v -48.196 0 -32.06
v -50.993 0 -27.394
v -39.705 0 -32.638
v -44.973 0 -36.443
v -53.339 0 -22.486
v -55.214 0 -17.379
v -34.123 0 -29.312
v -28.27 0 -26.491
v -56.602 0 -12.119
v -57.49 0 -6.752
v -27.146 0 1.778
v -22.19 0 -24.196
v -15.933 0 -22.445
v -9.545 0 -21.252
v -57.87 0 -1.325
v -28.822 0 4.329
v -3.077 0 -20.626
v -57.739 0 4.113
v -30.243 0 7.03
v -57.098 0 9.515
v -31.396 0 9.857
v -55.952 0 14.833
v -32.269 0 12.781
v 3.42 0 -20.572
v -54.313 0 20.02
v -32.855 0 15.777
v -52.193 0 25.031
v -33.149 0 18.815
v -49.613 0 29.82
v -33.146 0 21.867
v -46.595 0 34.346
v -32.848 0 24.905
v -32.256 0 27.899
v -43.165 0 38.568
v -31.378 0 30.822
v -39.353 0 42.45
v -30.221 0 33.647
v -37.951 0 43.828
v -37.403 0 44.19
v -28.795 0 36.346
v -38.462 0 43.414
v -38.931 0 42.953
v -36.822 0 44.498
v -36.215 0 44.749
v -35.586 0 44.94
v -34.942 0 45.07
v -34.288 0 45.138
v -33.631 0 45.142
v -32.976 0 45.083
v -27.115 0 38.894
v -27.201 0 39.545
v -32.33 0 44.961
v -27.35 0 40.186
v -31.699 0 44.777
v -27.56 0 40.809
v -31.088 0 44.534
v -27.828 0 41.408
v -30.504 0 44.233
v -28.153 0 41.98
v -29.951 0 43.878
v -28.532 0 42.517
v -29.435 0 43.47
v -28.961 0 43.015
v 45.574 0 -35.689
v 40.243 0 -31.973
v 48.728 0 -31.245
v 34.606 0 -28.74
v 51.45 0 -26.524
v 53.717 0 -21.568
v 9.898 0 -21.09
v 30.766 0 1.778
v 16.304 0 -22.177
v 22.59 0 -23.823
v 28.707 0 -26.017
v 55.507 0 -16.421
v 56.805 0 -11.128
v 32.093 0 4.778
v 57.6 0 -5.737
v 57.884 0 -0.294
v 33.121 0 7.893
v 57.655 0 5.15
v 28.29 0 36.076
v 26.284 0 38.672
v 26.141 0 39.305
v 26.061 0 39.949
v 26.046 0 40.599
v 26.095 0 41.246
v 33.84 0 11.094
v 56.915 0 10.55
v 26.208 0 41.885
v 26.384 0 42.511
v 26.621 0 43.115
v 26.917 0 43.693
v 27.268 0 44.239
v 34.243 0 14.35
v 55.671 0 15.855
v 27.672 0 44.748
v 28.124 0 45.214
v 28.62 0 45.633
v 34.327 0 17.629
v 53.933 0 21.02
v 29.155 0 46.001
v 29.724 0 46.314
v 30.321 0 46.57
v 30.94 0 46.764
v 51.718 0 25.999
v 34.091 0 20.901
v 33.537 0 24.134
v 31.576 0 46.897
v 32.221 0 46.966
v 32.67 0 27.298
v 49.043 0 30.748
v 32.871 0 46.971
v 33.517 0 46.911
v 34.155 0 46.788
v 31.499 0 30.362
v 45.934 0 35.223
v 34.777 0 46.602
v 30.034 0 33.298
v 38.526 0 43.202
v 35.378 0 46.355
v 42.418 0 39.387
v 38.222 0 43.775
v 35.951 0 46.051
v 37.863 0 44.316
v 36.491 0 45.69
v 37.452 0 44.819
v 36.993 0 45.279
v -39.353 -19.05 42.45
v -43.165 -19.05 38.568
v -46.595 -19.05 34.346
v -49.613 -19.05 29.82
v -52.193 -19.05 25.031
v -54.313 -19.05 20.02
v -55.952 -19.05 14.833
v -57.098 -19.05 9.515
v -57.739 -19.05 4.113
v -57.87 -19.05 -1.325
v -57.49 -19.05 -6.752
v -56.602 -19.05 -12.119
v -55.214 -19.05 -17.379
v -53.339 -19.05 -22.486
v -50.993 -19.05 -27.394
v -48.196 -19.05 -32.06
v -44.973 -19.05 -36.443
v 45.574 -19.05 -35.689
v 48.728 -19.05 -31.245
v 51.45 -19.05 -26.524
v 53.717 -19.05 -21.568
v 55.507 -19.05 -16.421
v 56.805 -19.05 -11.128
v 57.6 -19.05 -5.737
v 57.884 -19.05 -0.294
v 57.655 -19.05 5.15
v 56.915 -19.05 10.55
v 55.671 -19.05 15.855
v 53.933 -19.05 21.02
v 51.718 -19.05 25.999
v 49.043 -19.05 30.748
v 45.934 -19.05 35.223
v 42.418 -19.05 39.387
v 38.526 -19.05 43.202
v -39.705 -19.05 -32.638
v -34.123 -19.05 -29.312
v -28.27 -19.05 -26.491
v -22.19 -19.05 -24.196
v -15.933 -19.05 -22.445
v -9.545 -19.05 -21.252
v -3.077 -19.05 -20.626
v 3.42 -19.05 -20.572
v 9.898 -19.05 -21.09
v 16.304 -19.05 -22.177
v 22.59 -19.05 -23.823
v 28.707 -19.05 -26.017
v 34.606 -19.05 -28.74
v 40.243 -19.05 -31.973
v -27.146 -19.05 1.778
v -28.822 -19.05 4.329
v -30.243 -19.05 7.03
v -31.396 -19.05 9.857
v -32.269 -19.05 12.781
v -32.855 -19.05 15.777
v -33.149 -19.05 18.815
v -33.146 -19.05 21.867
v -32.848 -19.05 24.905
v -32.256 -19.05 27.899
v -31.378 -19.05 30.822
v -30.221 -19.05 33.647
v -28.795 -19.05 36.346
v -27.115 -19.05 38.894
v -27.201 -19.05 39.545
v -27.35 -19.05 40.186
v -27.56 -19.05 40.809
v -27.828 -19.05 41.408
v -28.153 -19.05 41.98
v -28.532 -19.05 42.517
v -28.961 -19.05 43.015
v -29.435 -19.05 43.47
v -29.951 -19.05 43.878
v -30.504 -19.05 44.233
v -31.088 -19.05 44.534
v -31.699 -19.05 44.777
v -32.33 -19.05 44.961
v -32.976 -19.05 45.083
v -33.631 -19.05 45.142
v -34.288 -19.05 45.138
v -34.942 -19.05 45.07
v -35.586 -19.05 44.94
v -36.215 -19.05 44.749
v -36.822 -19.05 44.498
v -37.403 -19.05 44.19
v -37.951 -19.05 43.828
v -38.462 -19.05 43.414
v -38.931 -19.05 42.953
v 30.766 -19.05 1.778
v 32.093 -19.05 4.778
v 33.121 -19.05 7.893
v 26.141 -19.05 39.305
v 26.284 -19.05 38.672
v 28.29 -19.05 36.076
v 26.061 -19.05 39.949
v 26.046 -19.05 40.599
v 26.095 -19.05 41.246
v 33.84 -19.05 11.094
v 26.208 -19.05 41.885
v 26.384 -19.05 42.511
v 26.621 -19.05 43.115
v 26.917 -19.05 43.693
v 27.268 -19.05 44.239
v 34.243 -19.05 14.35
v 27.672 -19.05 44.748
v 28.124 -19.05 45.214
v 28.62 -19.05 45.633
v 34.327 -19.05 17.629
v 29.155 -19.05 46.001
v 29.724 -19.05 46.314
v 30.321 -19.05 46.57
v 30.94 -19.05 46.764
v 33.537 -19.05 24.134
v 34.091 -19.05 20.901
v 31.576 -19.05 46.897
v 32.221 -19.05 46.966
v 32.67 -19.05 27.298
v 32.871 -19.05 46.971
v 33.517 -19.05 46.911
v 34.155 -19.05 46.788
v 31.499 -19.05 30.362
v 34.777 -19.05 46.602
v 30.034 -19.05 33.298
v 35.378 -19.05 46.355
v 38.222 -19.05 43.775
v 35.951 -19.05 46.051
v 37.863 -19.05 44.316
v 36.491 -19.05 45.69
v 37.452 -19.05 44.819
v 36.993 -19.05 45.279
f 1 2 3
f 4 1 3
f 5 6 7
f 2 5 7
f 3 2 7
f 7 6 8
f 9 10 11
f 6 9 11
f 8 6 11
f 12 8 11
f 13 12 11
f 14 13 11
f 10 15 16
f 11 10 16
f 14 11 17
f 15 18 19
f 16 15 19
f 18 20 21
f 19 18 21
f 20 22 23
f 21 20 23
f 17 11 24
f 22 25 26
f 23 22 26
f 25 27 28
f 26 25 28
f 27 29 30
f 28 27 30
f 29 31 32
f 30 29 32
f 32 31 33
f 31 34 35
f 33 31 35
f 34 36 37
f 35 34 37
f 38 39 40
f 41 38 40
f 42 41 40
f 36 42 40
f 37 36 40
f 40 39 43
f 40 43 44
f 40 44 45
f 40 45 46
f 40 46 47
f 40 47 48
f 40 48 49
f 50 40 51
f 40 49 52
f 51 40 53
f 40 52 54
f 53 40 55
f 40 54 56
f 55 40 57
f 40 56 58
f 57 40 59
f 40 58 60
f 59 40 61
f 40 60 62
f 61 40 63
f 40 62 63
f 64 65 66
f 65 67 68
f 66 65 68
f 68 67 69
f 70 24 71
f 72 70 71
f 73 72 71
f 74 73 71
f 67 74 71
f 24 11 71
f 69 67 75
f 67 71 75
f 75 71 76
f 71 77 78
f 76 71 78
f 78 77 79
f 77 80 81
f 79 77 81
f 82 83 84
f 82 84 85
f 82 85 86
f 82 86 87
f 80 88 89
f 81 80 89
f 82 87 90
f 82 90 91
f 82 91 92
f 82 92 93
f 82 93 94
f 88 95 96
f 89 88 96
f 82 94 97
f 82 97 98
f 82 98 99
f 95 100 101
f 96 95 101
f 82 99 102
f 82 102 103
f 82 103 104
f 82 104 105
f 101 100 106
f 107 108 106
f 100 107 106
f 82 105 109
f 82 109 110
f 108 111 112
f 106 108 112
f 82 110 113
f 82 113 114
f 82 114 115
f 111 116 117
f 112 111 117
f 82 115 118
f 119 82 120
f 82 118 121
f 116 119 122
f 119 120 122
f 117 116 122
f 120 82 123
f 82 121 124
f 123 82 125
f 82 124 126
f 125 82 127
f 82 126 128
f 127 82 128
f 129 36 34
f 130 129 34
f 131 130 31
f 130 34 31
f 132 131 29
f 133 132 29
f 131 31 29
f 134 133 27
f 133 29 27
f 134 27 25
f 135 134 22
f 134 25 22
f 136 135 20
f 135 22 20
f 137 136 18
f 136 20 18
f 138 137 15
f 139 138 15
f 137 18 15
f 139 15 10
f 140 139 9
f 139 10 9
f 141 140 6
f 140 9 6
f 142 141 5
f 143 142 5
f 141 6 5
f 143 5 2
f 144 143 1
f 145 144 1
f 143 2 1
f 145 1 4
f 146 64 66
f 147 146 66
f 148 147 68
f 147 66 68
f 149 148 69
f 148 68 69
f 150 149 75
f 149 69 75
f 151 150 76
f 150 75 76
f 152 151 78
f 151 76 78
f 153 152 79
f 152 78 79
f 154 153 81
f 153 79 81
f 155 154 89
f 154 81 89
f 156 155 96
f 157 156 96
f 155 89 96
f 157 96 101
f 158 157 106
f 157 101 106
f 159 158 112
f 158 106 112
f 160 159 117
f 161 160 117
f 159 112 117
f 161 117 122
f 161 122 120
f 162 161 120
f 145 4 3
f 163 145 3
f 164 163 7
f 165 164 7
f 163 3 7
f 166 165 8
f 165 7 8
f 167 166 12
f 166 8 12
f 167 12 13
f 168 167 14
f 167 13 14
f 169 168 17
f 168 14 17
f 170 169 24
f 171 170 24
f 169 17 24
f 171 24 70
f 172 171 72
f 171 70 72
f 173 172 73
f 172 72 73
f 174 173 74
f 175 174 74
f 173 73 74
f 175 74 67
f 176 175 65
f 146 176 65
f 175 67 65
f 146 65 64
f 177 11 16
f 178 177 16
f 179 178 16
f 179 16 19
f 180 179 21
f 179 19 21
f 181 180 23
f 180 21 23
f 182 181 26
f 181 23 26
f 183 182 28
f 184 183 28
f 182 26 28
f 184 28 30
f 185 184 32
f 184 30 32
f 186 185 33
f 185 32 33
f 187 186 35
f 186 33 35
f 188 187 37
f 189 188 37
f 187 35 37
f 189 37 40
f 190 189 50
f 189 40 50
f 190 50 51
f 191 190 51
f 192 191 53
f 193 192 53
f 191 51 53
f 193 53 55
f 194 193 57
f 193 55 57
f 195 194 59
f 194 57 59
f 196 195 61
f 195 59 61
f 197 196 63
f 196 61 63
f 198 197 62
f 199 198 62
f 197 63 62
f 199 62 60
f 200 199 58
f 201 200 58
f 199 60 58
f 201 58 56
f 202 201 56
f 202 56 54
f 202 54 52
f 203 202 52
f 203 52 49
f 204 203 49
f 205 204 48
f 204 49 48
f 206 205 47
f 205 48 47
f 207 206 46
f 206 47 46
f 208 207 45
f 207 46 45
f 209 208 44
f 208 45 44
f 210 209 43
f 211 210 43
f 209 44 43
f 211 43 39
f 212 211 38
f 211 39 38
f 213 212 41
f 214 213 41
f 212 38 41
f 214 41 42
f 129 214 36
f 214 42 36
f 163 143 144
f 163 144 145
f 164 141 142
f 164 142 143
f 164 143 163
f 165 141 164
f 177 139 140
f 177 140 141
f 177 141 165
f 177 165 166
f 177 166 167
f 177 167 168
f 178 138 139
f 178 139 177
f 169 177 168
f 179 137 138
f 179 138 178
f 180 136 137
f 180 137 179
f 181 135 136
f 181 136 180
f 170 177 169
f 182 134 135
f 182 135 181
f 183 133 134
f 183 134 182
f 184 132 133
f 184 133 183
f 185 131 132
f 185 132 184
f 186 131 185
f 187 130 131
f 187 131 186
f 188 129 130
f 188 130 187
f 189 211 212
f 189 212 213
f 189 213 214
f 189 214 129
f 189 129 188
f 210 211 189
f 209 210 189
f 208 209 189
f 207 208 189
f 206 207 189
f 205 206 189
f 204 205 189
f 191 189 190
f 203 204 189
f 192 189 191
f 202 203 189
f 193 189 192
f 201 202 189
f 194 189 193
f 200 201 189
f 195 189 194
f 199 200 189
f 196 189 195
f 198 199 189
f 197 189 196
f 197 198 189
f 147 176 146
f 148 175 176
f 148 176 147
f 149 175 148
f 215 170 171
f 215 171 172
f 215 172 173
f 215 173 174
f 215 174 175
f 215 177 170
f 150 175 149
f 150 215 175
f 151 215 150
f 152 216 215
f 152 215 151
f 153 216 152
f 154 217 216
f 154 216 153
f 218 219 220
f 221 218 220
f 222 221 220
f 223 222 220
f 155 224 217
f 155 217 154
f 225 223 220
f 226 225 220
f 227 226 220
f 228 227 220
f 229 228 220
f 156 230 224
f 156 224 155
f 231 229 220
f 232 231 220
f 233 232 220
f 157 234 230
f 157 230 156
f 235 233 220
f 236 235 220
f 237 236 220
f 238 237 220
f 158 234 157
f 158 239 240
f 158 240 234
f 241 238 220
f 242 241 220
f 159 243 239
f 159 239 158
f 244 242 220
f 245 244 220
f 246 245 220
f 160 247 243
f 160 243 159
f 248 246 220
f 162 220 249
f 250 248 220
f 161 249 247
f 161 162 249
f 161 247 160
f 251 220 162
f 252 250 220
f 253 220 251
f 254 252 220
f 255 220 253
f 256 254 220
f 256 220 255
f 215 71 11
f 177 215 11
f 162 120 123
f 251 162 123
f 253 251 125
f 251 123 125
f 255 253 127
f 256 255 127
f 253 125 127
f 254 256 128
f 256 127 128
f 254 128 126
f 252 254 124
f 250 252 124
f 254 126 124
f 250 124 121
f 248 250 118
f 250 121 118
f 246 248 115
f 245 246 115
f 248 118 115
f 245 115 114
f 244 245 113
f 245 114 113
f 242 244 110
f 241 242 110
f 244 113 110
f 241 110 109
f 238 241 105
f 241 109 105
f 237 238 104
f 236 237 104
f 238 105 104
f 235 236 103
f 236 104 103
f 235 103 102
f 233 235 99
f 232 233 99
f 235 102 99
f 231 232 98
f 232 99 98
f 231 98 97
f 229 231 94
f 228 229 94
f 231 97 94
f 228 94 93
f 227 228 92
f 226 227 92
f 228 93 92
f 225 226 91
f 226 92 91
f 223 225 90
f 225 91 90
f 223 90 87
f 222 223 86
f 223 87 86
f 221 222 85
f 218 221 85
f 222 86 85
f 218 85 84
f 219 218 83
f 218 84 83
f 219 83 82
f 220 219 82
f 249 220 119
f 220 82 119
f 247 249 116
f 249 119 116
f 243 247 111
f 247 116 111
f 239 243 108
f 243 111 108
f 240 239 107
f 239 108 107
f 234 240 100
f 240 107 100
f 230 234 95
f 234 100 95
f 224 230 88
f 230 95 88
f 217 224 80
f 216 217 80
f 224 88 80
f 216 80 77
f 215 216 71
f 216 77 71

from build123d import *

# Parameters (mm, degrees)
F0_W     = 7.112
F0_H     = 7.316239
F1_DEPTH = 19.05


with BuildPart() as f1:
    # F0 (on Front) → F1 (new body)
    with BuildSketch(Plane.XZ):
        with BuildLine():
            ThreePointArc((-27.114501, 38.893752), (-32.012181, 44.876616), (-39.353315, 42.44975))
            ThreePointArc((-39.353315, 42.44975), (-57.738612, 4.113074), (-44.973303, -36.44265))
            ThreePointArc((-44.973303, -36.44265), (0.170855, -20.527097), (45.573682, -35.688993))
            ThreePointArc((45.573682, -35.688993), (57.655342, 5.150357), (38.526372, 43.201659))
            ThreePointArc((38.526372, 43.201659), (30.320612, 46.569585), (26.283572, 38.671501))
            ThreePointArc((26.283572, 38.671501), (34.091174, 20.901024), (30.76575, 1.778))
            Line((30.76575, 1.778), (-14.44625, 1.778))
            Line((-14.44625, 1.778), (-27.14625, 1.778))
            ThreePointArc((-27.14625, 1.778), (-33.184244, 20.341054), (-27.114501, 38.893752))
        make_face()
        with Locations((1.80975, -8.780336)):
            Rectangle(F0_W, F0_H, mode=Mode.SUBTRACT)
        with Locations((1.80975, -8.780336)):
            Rectangle(F0_W, F0_H)
    extrude(amount=F1_DEPTH)


solid = f1.part
